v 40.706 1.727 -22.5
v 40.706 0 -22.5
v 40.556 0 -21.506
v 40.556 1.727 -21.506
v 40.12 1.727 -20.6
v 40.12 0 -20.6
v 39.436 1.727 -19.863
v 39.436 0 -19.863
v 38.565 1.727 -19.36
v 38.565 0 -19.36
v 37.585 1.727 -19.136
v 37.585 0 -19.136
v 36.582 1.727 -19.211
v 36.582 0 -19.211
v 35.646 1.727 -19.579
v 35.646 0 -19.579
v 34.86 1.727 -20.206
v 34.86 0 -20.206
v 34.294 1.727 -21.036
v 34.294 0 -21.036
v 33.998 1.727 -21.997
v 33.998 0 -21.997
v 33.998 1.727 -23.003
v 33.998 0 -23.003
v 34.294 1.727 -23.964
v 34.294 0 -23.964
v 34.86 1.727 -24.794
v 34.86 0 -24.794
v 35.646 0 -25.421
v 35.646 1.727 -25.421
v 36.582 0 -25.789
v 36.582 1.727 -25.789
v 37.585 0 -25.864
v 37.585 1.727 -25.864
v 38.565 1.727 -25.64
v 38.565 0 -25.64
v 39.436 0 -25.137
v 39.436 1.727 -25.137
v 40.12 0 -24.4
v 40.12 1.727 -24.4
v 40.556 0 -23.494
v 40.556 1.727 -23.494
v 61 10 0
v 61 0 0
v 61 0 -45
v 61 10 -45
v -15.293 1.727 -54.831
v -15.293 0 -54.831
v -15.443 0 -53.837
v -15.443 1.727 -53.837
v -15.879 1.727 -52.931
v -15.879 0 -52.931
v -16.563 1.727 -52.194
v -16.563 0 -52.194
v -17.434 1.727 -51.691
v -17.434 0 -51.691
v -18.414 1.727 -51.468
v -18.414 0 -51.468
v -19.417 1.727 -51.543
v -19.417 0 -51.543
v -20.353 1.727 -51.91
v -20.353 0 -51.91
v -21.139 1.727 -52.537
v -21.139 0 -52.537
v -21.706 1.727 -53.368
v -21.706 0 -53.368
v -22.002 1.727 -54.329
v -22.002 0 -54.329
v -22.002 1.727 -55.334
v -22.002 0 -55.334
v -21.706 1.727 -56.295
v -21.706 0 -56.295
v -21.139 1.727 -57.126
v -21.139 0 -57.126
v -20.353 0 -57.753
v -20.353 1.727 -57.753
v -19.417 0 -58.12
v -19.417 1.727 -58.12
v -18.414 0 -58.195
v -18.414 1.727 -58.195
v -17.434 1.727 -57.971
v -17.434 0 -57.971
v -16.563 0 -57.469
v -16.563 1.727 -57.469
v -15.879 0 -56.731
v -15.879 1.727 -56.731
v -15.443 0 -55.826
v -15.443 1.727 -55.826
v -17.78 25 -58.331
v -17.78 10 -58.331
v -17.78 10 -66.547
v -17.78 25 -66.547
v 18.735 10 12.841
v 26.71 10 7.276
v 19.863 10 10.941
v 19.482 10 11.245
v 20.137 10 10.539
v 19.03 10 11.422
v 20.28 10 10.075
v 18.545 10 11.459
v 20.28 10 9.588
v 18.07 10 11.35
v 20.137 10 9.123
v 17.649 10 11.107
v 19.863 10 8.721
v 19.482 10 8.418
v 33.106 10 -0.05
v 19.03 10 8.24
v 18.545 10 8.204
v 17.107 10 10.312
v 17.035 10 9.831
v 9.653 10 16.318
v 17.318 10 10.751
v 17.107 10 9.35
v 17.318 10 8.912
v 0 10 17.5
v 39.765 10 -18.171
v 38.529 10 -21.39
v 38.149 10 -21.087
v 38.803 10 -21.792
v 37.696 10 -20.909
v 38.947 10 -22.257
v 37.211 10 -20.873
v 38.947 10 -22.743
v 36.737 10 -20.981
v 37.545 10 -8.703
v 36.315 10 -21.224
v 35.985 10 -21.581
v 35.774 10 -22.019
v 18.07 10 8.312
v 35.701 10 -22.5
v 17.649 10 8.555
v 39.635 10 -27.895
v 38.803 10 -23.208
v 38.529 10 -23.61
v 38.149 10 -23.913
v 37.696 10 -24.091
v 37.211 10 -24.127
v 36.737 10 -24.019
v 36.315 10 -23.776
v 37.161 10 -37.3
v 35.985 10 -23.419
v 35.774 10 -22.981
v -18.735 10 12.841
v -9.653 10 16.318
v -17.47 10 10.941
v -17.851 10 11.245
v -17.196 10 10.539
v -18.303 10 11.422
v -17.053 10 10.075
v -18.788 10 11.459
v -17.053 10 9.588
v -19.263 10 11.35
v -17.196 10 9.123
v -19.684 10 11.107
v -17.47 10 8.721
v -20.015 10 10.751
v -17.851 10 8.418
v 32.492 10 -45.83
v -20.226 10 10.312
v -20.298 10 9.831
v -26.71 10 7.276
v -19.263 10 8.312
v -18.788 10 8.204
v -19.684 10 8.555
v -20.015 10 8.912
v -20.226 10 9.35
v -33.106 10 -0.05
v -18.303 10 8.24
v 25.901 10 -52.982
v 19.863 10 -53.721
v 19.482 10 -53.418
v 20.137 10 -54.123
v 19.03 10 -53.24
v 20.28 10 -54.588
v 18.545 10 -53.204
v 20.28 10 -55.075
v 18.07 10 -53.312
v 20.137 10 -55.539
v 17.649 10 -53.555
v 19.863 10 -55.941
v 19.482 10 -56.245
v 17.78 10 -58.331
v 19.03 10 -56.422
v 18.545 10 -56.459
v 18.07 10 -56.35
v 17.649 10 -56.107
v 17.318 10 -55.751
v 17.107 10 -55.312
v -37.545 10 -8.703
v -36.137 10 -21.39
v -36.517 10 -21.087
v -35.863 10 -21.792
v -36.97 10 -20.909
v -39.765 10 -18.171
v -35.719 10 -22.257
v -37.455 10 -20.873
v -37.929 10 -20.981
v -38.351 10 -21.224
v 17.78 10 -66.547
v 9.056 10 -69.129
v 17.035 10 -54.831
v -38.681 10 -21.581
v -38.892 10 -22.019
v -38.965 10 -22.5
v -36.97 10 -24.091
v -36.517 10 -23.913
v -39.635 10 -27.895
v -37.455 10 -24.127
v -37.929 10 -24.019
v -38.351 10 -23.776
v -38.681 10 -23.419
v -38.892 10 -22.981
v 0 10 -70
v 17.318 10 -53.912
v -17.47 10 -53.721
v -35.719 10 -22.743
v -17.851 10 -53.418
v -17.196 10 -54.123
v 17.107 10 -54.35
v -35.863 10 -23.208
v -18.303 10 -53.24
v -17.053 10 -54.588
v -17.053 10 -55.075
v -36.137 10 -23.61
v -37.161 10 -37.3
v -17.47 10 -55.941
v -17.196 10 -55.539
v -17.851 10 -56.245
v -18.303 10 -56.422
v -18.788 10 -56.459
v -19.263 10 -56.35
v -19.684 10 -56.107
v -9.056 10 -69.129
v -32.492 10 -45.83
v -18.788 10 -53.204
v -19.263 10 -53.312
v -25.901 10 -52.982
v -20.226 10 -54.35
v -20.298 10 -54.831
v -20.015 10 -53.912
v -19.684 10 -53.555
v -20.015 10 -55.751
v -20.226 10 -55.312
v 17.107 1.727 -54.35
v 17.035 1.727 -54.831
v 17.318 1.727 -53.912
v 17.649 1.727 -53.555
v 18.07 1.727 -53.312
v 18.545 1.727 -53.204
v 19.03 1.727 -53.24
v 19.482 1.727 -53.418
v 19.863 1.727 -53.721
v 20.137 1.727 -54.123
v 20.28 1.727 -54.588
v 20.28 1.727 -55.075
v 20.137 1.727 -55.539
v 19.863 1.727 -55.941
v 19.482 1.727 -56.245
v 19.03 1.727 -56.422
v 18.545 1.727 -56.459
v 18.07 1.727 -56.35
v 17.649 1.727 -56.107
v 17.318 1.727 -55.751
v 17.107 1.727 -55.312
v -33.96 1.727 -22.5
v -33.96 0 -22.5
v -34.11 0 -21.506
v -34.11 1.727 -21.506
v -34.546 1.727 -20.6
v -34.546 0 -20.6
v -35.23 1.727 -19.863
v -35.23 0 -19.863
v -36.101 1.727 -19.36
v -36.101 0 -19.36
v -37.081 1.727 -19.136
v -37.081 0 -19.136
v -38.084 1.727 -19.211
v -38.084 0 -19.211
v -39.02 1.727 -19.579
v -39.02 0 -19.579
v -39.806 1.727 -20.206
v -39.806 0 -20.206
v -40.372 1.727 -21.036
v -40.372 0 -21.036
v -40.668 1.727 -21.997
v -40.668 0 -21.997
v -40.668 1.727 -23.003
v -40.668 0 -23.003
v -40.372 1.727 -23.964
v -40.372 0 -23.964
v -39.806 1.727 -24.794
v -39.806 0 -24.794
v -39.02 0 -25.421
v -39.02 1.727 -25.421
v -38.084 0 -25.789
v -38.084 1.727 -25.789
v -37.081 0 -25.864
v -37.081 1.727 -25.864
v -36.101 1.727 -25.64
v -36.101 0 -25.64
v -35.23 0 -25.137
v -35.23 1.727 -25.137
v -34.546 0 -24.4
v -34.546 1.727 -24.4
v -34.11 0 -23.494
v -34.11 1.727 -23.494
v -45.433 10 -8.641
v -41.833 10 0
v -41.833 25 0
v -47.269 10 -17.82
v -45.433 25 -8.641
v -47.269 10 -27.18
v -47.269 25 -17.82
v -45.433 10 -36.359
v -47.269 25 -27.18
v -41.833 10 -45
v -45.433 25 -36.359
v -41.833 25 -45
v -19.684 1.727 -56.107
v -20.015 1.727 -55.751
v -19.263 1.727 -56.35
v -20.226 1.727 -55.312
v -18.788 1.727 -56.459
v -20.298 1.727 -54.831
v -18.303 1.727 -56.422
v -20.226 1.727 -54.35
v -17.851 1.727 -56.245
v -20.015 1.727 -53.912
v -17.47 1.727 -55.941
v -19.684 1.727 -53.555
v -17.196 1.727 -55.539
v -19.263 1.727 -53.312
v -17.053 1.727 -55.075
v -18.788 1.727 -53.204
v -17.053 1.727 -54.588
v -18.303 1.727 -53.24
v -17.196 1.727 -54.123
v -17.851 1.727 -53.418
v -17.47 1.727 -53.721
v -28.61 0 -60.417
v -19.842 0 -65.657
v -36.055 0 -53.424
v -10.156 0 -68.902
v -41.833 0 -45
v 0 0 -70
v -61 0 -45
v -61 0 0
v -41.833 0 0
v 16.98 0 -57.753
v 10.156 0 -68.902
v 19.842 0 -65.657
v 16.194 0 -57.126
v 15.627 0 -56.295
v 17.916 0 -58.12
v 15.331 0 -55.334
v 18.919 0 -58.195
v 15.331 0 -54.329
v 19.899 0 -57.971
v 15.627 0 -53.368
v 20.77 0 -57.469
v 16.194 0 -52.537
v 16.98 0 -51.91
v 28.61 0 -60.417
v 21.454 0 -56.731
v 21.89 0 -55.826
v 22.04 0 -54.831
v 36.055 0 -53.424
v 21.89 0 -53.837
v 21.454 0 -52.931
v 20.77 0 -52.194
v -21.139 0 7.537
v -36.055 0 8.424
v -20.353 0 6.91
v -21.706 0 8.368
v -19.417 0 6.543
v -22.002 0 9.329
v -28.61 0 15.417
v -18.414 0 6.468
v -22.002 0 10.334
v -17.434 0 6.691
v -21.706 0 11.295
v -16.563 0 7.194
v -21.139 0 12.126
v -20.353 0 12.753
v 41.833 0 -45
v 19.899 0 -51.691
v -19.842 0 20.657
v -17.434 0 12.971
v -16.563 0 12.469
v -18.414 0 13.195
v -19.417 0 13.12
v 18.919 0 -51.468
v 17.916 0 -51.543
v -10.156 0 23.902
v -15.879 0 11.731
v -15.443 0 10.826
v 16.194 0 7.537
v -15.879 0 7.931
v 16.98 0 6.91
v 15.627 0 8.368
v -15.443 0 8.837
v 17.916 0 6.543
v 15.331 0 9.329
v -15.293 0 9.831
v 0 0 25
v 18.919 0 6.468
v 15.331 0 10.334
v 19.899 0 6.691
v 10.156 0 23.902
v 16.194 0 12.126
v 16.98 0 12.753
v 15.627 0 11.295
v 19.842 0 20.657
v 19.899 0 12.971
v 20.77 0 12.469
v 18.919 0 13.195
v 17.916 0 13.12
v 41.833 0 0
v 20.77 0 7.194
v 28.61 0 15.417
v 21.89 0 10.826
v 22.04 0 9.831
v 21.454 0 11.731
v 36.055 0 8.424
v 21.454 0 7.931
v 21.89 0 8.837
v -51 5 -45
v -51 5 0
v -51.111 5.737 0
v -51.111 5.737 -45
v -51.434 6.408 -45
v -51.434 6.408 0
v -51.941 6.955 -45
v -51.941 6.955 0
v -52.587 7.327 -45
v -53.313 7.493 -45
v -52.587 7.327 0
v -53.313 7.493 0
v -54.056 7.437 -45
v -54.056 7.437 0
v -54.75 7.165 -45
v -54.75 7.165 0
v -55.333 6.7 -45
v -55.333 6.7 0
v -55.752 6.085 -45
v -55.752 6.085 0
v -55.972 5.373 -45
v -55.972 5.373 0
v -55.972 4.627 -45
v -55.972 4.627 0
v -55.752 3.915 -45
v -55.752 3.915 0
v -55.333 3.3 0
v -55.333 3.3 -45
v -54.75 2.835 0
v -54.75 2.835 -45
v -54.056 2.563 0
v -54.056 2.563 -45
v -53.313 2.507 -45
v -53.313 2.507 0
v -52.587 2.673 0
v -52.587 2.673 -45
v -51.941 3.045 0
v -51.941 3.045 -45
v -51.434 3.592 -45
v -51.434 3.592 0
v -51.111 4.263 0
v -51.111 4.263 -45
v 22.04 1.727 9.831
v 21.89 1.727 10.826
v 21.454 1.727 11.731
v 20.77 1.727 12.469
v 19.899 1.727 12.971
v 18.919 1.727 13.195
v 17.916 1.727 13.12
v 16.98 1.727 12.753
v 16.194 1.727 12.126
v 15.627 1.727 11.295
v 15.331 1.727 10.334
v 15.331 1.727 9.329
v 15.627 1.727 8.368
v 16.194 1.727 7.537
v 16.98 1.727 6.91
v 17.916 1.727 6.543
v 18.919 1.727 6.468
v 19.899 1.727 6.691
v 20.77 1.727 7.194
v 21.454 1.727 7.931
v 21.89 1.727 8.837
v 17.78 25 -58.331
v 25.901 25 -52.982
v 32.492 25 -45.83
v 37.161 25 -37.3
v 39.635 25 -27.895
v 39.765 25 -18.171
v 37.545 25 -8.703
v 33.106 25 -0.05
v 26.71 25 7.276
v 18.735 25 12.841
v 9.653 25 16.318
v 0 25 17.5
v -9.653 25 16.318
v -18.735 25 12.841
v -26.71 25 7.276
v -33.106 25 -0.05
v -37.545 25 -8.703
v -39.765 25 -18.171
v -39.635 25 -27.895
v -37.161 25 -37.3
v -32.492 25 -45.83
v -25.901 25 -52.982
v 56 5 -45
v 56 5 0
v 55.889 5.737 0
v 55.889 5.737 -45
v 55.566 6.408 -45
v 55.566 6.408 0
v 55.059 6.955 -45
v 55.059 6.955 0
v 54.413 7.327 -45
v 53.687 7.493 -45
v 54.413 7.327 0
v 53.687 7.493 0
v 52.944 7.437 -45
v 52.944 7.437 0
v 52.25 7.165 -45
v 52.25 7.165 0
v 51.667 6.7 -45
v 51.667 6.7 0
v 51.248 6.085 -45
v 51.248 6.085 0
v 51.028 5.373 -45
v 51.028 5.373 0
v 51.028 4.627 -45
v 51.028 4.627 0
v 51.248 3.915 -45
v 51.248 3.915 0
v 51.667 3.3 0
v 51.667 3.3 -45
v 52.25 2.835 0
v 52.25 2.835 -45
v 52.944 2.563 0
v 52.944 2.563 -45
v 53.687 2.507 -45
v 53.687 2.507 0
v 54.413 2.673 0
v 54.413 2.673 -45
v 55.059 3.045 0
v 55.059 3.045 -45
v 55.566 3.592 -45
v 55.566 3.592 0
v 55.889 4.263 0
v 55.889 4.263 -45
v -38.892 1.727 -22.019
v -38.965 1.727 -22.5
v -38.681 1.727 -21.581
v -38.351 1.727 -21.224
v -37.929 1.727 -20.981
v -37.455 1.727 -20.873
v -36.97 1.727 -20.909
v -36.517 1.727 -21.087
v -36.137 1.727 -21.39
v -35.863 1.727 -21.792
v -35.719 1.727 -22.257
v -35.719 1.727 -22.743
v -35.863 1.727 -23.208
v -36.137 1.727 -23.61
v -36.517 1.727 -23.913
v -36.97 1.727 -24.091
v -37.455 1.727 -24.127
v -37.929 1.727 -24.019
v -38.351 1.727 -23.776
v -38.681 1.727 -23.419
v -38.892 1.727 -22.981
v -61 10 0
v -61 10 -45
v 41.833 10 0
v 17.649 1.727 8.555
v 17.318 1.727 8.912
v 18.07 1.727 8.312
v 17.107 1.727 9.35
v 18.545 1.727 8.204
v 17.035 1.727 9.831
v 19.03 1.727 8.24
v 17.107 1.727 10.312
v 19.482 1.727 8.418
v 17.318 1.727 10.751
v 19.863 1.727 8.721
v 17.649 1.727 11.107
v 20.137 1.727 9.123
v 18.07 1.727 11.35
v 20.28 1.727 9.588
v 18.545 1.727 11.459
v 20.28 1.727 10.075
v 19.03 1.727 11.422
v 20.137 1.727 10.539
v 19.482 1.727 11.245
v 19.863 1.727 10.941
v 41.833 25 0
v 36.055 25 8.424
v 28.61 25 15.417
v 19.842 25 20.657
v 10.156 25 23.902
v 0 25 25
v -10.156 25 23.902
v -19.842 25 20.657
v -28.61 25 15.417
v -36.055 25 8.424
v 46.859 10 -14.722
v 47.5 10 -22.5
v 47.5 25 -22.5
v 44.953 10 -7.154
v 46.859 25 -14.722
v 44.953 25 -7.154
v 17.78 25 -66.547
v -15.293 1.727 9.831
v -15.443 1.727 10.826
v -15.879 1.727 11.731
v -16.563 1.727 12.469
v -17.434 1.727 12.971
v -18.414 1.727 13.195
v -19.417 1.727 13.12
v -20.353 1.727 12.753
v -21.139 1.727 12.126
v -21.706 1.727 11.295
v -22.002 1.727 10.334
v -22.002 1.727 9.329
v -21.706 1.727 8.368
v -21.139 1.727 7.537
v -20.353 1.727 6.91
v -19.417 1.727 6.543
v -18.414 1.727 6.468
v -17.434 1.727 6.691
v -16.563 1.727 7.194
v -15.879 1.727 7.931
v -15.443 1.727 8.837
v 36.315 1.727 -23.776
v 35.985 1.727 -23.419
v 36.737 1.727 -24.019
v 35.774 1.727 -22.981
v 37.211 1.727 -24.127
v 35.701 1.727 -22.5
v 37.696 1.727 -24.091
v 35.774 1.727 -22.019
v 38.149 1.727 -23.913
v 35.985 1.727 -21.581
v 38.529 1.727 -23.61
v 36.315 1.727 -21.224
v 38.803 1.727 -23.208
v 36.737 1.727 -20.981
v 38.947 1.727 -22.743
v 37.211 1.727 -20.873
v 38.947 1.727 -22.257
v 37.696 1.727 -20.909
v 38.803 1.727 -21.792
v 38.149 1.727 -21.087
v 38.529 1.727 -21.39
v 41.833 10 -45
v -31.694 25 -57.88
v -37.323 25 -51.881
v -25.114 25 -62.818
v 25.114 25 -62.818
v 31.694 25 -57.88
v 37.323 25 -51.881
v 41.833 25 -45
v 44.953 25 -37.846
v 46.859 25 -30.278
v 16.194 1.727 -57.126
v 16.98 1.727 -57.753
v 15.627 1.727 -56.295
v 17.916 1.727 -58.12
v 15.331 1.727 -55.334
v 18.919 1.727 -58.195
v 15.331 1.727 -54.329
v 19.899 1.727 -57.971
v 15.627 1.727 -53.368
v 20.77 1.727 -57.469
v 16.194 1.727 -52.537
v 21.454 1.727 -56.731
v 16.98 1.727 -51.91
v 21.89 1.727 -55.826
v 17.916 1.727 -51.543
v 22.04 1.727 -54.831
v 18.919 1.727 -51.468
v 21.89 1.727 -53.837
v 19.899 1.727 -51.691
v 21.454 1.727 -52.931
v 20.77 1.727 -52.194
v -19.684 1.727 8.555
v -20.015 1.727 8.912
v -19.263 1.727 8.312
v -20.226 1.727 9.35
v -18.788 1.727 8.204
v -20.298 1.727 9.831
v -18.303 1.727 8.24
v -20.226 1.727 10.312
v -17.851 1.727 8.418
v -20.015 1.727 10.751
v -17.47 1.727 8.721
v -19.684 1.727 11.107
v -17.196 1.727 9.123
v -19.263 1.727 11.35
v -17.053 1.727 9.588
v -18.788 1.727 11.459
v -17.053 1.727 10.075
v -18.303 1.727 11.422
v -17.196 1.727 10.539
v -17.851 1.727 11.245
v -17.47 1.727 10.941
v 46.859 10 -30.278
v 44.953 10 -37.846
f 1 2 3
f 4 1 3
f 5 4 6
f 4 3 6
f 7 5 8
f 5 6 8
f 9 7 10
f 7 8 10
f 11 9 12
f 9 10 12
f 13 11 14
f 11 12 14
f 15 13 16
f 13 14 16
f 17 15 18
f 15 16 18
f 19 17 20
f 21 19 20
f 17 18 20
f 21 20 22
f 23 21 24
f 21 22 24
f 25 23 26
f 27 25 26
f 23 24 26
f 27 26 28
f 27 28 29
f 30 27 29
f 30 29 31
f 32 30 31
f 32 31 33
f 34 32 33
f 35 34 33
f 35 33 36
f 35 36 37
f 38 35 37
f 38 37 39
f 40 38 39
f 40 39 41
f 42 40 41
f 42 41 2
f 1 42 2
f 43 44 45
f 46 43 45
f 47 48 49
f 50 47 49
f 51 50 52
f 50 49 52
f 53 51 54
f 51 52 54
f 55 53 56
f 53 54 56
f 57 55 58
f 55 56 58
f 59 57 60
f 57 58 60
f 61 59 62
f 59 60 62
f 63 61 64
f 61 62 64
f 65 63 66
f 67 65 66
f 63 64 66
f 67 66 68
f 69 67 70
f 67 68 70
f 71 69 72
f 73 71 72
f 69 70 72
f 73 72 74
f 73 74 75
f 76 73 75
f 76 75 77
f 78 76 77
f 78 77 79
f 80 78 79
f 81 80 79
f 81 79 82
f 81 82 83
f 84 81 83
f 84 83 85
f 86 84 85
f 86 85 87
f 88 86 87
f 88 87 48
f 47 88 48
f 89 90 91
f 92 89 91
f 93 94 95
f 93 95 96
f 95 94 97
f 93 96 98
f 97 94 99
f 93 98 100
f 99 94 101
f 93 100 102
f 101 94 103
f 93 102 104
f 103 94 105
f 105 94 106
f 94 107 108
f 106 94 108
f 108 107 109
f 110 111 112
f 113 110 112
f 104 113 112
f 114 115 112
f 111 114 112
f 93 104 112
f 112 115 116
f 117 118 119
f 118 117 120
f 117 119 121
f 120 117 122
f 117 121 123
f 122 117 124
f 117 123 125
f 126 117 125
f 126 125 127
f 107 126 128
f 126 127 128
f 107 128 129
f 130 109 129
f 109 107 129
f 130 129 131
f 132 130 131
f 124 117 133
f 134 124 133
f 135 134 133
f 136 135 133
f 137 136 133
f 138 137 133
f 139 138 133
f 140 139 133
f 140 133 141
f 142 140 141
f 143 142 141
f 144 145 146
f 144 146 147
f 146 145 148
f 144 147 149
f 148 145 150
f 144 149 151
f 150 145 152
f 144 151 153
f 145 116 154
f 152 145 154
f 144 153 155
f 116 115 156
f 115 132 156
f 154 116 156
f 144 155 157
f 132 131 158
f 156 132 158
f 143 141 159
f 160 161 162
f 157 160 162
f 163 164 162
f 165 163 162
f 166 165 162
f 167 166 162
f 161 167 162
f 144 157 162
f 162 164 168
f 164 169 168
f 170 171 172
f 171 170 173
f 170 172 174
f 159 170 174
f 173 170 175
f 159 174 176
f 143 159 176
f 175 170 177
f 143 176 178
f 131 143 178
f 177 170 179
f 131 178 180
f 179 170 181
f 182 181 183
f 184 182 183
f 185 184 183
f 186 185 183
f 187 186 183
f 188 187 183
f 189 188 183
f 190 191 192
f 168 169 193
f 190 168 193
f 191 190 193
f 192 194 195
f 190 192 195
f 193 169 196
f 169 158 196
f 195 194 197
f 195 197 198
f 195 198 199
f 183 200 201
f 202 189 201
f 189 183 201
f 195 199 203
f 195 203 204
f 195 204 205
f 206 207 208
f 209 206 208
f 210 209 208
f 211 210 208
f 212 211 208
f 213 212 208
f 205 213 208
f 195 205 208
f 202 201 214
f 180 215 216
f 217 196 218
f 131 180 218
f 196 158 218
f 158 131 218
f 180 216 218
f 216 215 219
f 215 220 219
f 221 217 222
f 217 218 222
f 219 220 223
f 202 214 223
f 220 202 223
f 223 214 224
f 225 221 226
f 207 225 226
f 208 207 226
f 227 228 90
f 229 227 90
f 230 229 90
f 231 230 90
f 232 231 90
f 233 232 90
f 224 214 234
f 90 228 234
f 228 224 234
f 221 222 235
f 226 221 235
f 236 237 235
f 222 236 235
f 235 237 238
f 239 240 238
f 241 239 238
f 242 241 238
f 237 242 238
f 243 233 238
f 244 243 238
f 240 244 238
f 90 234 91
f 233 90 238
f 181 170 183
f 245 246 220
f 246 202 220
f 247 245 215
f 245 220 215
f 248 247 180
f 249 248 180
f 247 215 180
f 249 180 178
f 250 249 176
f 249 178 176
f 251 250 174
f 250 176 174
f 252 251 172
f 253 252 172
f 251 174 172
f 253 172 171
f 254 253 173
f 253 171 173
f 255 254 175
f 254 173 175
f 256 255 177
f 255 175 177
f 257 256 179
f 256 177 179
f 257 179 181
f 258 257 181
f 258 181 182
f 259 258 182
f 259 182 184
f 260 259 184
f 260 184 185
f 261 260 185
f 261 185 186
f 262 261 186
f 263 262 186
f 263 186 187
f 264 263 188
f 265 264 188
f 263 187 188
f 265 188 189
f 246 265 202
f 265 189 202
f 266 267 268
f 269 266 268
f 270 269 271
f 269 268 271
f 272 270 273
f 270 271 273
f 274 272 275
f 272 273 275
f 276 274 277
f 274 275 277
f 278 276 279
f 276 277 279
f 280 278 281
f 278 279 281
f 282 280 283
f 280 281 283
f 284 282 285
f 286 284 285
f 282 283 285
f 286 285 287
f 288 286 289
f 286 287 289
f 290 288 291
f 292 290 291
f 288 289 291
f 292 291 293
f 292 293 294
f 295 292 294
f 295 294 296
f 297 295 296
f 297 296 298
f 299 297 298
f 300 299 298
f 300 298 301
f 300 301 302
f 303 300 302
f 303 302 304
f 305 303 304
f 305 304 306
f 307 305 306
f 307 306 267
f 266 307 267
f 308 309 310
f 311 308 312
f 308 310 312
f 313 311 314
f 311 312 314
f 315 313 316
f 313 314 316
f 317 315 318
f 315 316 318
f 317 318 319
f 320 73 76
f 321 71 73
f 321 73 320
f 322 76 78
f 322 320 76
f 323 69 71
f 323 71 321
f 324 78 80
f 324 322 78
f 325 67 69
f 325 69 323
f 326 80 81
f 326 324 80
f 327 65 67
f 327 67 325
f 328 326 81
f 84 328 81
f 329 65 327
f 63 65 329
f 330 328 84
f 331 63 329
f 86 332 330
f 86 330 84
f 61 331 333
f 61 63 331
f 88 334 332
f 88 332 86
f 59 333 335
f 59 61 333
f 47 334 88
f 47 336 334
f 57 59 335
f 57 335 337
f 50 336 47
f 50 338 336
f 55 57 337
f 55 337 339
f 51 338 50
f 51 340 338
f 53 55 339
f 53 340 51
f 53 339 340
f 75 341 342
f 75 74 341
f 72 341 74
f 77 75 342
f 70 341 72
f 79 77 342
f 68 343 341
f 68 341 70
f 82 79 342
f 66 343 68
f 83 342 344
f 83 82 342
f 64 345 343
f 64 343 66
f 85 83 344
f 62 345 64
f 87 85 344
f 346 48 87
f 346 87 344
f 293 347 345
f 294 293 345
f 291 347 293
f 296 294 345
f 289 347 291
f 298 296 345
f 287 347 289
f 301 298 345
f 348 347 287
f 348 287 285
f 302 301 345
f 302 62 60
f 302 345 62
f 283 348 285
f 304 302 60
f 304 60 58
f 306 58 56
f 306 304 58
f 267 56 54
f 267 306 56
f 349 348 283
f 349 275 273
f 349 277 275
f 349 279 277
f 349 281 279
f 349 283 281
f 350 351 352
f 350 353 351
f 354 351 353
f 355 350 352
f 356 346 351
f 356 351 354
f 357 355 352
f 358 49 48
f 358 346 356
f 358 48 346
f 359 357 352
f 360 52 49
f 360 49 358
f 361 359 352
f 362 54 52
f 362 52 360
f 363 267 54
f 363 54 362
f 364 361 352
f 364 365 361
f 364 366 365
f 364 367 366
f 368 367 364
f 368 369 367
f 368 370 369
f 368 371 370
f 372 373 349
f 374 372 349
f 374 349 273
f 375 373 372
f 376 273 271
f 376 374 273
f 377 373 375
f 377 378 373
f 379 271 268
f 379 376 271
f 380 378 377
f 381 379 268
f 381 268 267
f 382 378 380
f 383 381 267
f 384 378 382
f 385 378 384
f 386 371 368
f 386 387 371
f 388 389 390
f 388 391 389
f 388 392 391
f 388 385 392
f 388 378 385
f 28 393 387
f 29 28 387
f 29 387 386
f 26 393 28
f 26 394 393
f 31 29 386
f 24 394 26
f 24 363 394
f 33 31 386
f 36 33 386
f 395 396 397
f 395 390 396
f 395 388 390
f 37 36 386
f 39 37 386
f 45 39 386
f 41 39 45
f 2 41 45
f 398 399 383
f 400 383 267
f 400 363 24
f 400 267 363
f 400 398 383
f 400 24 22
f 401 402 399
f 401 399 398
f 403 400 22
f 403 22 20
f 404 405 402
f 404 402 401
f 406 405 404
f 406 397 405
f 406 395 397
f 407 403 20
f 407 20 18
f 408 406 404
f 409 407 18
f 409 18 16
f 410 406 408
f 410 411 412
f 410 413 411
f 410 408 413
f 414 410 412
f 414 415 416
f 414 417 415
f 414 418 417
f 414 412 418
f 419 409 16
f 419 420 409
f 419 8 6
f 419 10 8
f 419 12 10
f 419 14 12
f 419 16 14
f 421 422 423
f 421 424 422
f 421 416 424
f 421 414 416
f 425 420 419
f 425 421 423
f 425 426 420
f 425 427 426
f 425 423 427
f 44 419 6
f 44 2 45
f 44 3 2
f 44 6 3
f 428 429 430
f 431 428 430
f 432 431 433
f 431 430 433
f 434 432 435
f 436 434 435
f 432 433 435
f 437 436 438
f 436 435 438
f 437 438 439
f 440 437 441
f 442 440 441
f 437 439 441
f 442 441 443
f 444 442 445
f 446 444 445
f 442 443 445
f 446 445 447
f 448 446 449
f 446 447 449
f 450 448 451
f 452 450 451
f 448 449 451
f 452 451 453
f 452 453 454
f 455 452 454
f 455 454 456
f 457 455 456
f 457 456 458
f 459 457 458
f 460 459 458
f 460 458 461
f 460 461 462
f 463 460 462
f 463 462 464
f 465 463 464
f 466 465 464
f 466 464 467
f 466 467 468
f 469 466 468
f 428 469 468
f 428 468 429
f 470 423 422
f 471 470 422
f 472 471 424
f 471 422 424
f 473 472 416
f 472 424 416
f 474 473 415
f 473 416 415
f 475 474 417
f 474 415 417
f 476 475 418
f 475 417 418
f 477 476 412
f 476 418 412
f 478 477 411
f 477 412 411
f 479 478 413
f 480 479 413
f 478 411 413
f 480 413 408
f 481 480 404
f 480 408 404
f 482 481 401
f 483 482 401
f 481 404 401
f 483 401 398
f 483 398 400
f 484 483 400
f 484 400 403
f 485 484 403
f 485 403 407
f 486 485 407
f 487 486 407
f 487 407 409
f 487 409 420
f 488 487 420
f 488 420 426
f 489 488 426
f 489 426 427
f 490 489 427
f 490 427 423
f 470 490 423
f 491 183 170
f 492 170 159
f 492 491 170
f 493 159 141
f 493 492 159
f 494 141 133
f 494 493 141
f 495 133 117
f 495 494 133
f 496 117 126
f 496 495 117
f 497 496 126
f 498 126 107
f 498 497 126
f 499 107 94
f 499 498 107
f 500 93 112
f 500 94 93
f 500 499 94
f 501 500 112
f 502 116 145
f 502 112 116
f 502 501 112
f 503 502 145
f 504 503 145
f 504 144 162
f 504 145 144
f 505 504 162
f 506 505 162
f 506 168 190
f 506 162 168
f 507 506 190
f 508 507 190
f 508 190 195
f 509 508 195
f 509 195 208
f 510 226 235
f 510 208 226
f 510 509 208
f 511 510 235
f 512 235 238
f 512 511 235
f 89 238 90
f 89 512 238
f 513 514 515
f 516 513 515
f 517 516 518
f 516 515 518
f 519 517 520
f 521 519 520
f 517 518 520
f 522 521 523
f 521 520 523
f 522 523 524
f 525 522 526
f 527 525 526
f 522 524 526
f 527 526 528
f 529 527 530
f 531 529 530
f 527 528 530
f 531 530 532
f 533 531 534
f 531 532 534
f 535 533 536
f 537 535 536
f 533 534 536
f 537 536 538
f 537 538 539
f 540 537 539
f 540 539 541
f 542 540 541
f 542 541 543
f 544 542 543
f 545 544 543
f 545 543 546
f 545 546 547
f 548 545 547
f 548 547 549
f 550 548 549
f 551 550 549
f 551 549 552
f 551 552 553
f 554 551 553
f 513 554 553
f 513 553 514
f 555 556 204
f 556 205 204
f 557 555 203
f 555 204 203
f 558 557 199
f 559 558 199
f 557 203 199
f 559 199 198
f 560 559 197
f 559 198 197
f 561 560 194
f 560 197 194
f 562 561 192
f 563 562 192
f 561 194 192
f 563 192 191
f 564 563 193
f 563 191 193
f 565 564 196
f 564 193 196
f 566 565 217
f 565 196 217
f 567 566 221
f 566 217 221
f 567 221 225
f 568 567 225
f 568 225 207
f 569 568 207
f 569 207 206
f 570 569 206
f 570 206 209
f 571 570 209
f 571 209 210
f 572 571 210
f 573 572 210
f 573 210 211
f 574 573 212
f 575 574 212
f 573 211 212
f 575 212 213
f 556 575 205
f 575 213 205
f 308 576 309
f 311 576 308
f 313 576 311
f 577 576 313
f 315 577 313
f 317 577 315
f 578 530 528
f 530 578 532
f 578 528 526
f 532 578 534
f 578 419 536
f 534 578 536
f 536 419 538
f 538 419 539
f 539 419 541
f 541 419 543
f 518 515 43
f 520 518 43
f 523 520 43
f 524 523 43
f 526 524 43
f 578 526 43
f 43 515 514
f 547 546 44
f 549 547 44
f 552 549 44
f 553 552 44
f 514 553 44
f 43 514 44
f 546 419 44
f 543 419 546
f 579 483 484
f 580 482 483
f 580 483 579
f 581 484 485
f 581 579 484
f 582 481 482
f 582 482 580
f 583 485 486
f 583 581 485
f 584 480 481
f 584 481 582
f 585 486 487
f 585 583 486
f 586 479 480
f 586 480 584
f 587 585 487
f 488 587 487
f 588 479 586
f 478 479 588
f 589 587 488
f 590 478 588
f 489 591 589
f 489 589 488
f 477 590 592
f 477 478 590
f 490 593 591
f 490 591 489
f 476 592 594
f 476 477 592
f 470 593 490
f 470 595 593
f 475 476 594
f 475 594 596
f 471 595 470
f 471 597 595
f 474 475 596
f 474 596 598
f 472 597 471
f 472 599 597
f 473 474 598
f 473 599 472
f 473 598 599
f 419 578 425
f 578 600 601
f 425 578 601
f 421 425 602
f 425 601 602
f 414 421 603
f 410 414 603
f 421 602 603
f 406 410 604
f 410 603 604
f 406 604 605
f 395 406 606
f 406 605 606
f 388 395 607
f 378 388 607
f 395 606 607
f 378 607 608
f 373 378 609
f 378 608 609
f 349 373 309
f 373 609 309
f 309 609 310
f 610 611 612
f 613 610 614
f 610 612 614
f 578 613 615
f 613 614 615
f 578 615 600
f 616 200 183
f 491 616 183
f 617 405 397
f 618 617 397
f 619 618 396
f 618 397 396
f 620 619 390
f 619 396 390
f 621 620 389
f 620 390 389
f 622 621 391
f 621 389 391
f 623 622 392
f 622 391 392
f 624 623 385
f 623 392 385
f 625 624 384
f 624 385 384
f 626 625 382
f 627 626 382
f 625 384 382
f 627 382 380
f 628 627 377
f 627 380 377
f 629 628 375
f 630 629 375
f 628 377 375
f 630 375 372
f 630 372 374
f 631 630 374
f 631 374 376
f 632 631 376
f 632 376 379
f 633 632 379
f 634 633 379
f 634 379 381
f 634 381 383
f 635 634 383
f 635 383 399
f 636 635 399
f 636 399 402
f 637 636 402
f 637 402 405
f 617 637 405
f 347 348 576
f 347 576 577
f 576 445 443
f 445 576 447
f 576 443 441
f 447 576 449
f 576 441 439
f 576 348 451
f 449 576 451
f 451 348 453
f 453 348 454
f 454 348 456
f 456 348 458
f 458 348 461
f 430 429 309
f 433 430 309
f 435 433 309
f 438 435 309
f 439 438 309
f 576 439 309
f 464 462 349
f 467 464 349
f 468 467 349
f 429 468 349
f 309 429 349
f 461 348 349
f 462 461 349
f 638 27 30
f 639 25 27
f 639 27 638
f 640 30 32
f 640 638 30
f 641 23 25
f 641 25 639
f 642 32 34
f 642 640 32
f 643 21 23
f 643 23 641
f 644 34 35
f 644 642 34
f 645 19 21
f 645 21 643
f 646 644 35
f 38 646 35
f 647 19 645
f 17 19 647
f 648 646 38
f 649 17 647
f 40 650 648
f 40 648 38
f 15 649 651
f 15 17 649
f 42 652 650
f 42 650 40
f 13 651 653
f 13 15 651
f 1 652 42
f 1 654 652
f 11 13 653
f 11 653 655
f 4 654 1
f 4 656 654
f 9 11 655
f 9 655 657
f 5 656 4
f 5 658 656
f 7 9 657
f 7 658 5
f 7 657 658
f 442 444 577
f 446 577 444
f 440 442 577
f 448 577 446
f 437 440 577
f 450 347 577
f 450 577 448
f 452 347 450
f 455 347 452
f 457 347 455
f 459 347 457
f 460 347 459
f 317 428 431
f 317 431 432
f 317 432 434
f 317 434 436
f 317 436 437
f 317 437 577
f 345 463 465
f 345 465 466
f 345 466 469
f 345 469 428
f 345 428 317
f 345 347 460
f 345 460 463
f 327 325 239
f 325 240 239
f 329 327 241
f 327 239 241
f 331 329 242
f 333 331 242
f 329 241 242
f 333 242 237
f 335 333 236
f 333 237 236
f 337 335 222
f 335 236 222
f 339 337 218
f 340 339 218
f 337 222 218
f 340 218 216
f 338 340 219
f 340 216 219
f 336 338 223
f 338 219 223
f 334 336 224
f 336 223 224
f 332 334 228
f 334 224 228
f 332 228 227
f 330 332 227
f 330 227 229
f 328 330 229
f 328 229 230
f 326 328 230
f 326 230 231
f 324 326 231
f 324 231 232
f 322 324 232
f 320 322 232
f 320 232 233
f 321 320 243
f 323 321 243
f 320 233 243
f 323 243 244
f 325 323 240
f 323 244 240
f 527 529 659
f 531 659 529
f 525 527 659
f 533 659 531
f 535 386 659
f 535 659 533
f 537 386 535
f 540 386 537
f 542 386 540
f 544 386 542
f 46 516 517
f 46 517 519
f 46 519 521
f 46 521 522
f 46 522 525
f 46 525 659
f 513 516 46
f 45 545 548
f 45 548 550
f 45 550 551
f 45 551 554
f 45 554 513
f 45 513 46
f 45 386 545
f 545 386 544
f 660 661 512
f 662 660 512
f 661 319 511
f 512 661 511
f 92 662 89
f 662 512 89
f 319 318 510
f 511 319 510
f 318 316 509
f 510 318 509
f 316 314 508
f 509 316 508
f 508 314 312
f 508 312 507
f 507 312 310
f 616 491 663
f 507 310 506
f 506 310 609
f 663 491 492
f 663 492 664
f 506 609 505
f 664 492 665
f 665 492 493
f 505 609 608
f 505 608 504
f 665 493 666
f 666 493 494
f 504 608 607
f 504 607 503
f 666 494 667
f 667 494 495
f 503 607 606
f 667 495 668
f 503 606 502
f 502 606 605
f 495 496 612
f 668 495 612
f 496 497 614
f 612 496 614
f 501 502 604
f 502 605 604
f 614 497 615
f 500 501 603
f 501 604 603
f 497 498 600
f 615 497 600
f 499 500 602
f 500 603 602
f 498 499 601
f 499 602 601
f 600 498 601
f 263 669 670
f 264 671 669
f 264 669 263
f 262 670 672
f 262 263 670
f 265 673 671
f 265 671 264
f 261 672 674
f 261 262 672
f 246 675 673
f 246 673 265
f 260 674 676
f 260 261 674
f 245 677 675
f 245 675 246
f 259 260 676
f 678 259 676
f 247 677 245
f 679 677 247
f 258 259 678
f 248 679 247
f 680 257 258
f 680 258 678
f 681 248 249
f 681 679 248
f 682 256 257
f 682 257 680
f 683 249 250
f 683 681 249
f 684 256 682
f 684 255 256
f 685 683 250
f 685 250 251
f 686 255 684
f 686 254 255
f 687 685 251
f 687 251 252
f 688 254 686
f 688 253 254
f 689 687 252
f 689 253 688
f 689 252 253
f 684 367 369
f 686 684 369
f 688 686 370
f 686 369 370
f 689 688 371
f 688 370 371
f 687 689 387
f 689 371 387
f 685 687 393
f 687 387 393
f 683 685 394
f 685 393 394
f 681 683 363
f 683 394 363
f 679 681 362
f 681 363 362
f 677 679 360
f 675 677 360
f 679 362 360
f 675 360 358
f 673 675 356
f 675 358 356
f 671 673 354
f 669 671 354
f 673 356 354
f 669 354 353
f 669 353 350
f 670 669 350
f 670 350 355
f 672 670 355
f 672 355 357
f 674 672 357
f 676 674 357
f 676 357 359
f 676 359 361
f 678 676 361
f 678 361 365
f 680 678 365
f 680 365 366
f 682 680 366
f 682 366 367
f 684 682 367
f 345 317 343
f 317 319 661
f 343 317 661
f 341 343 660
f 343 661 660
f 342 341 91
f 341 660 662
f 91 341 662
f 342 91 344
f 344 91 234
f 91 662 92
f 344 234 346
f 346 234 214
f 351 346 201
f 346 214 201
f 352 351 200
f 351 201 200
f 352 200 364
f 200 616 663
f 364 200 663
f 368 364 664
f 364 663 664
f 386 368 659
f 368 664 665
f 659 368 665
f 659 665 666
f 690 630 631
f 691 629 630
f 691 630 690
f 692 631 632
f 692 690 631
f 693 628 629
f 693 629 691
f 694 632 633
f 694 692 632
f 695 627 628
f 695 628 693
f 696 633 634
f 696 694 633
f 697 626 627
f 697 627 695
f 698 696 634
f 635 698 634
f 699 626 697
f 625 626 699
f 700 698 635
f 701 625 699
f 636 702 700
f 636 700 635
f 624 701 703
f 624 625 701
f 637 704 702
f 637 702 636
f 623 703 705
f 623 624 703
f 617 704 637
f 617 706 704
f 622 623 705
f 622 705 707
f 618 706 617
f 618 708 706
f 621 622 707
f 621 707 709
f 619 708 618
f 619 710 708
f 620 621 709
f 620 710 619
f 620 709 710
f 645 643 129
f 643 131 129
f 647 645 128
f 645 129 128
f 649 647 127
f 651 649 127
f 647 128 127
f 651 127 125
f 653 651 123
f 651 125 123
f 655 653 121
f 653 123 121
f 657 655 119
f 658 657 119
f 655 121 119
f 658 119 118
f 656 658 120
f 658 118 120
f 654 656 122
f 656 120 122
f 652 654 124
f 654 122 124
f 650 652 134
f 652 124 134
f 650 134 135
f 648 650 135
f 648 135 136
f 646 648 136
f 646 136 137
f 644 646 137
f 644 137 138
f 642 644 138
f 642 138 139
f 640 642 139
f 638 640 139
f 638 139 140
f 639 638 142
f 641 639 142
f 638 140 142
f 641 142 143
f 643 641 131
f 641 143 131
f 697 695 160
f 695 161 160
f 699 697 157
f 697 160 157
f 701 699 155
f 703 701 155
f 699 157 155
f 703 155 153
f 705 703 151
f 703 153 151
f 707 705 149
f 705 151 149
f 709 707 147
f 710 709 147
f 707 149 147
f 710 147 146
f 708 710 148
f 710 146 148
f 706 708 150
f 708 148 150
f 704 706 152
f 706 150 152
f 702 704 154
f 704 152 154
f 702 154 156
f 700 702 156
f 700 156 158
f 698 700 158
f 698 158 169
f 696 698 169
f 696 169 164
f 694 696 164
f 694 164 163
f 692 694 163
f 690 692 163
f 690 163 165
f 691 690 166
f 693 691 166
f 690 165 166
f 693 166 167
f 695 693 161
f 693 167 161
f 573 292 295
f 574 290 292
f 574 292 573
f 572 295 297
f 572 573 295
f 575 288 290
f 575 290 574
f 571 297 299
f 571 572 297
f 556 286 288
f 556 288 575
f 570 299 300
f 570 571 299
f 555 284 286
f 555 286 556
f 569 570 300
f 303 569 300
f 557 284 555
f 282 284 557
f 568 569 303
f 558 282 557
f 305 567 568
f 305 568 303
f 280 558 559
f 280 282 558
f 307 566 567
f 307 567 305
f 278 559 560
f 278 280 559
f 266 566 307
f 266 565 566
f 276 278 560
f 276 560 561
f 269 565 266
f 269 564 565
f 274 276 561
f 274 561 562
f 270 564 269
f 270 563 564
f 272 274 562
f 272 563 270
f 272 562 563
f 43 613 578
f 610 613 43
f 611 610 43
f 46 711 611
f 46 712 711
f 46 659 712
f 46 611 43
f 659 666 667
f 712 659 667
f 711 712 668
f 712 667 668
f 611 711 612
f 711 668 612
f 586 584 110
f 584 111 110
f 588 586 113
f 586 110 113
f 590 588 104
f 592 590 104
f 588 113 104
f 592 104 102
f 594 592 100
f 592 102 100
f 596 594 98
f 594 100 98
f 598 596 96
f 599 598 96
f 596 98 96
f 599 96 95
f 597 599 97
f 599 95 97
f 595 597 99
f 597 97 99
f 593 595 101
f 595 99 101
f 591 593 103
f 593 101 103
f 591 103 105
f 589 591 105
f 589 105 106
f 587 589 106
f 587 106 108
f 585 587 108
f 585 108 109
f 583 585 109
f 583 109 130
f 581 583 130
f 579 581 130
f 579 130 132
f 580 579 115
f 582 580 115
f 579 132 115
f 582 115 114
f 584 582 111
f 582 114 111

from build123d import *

# Parameters (mm, degrees)
SKETCH7_W                                           = 122
SKETCH7_H                                           = 45
BOSS_EXTRUDE1_DEPTH                                 = 10
SKETCH9_R                                           = 2.5
BOSS_EXTRUDE2_DEPTH                                 = 10
BOSS_EXTRUDE3_START                                 = -25
SKETCH10_R                                          = 40
BOSS_EXTRUDE3_DEPTH                                 = 25
SKETCH11_R                                          = 2.5
CUT_EXTRUDE5_DEPTH                                  = 97.15612305
CUT_EXTRUDE6_DEPTH                                  = 95.053176448
CBORE_FOR_4_BINDING_HEAD_MACHINE_SCREW1_D           = 3.2639
CBORE_FOR_4_BINDING_HEAD_MACHINE_SCREW1_CBORE_D     = 6.74624
CBORE_FOR_4_BINDING_HEAD_MACHINE_SCREW1_CBORE_DEPTH = 1.7272


with BuildPart() as part:
    # Sketch7 → Boss-Extrude1 (new body)
    with BuildSketch(Plane(origin=(0, 0, 0), x_dir=(1, 0, 0), z_dir=(0, 1, 0))):
        with Locations((0, 22.5)):
            Rectangle(SKETCH7_W, SKETCH7_H)
    extrude(amount=BOSS_EXTRUDE1_DEPTH)

    # Sketch9 → Boss-Extrude2 (add)
    # profile 1 of 9: a face of its own
    with BuildSketch(Plane(origin=(0, 10, 0), x_dir=(1, 0, 0), z_dir=(0, 1, 0))):
        with BuildLine():
            ThreePointArc((35.858512086, 0), (40.682190705, 10.793495465), (42.333, 22.5))
            ThreePointArc((42.333, 22.5), (40.682190705, 34.206504535), (35.858512086, 45))
            Line((35.858512086, 45), (-35.858512086, 45))
            ThreePointArc((-35.858512086, 45), (-42.333, 22.5), (-35.858512086, 0))
            Line((-35.858512086, 0), (35.858512086, 0))
        make_face()
        with Locations((37.333, 22.5)):
            Circle(SKETCH9_R, mode=Mode.SUBTRACT)
        with Locations((-37.333, 22.5)):
            Circle(SKETCH9_R, mode=Mode.SUBTRACT)
    # profile 2 of 9: a face of its own
    with BuildSketch(Plane(origin=(0, 10, 0), x_dir=(1, 0, 0), z_dir=(0, 1, 0))):
        with Locations((37.333, 22.5)):
            Circle(SKETCH9_R)
    # profile 3 of 9: a face of its own
    with BuildSketch(Plane(origin=(0, 10, 0), x_dir=(1, 0, 0), z_dir=(0, 1, 0))):
        with Locations((-37.333, 22.5)):
            Circle(SKETCH9_R)
    # profile 4 of 9: a face of its own
    with BuildSketch(Plane(origin=(0, 10, 0), x_dir=(1, 0, 0), z_dir=(0, 1, 0))):
        with BuildLine():
            ThreePointArc((-35.858512086, 0), (0, -19.833), (35.858512086, 0))
            Line((35.858512086, 0), (-35.858512086, 0))
        make_face()
        with Locations((-18.6665, -9.831326399)):
            Circle(SKETCH9_R, mode=Mode.SUBTRACT)
        with Locations((18.6665, -9.831326399)):
            Circle(SKETCH9_R, mode=Mode.SUBTRACT)
    # profile 5 of 9: a face of its own
    with BuildSketch(Plane(origin=(0, 10, 0), x_dir=(1, 0, 0), z_dir=(0, 1, 0))):
        with Locations((18.6665, -9.831326399)):
            Circle(SKETCH9_R)
    # profile 6 of 9: a face of its own
    with BuildSketch(Plane(origin=(0, 10, 0), x_dir=(1, 0, 0), z_dir=(0, 1, 0))):
        with Locations((-18.6665, -9.831326399)):
            Circle(SKETCH9_R)
    # profile 7 of 9: a face of its own
    with BuildSketch(Plane(origin=(0, 10, 0), x_dir=(1, 0, 0), z_dir=(0, 1, 0))):
        with BuildLine():
            Line((-35.858512086, 45), (35.858512086, 45))
            ThreePointArc((35.858512086, 45), (0, 64.833), (-35.858512086, 45))
        make_face()
        with Locations((-18.6665, 54.831326399)):
            Circle(SKETCH9_R, mode=Mode.SUBTRACT)
        with Locations((18.6665, 54.831326399)):
            Circle(SKETCH9_R, mode=Mode.SUBTRACT)
    # profile 8 of 9: a face of its own
    with BuildSketch(Plane(origin=(0, 10, 0), x_dir=(1, 0, 0), z_dir=(0, 1, 0))):
        with Locations((18.6665, 54.831326399)):
            Circle(SKETCH9_R)
    # profile 9 of 9: a face of its own
    with BuildSketch(Plane(origin=(0, 10, 0), x_dir=(1, 0, 0), z_dir=(0, 1, 0))):
        with Locations((-18.6665, 54.831326399)):
            Circle(SKETCH9_R)
    extrude(amount=-BOSS_EXTRUDE2_DEPTH)

    # Sketch10 → Boss-Extrude3 (add)
    # profile 1 of 3: a face of its own
    with BuildSketch(Plane.XZ.offset(BOSS_EXTRUDE3_START)):
        with BuildLine():
            ThreePointArc((-41.833001327, -45), (0, -70), (41.833001327, -45))
            Line((41.833001327, -45), (35.858512086, -45))
            ThreePointArc((35.858512086, -45), (0, -64.833), (-35.858512086, -45))
            Line((-35.858512086, -45), (-41.833001327, -45))
        make_face()
    # profile 2 of 3: a face of its own
    with BuildSketch(Plane.XZ.offset(BOSS_EXTRUDE3_START)):
        with BuildLine():
            ThreePointArc((41.833001327, -45), (46.061467427, -34.101345547), (47.5, -22.5))
            ThreePointArc((47.5, -22.5), (46.061467427, -10.898654453), (41.833001327, 0))
            Line((41.833001327, 0), (35.858512086, 0))
            ThreePointArc((35.858512086, 0), (0, 19.833), (-35.858512086, 0))
            Line((-35.858512086, 0), (-41.833001327, 0))
            ThreePointArc((-41.833001327, 0), (-47.5, -22.5), (-41.833001327, -45))
            Line((-41.833001327, -45), (-35.858512086, -45))
            ThreePointArc((-35.858512086, -45), (0, -64.833), (35.858512086, -45))
            Line((35.858512086, -45), (41.833001327, -45))
        make_face()
        with Locations(Location((0, -22.5, 0), (0, 0, 270))):
            Circle(SKETCH10_R, mode=Mode.SUBTRACT)
    # profile 3 of 3: a face of its own
    with BuildSketch(Plane.XZ.offset(BOSS_EXTRUDE3_START)):
        with BuildLine():
            Line((35.858512086, 0), (41.833001327, 0))
            ThreePointArc((41.833001327, 0), (0, 25), (-41.833001327, 0))
            Line((-41.833001327, 0), (-35.858512086, 0))
            ThreePointArc((-35.858512086, 0), (0, 19.833), (35.858512086, 0))
        make_face()
    extrude(amount=BOSS_EXTRUDE3_DEPTH)

    # Sketch11 → Cut-Extrude5 (cut, through all)
    with BuildSketch(Plane.XY):
        with Locations((-53.5, 5)):
            Circle(SKETCH11_R)
        with Locations((53.5, 5)):
            Circle(SKETCH11_R)
    extrude(amount=-CUT_EXTRUDE5_DEPTH, mode=Mode.SUBTRACT)

    # Sketch12 → Cut-Extrude6 (cut, through all)
    with BuildSketch(Plane(origin=(0, 10, 0), x_dir=(1, 0, 0), z_dir=(0, 1, 0))):
        with BuildLine():
            Line((-17.78, 58.331154042), (-17.78, 66.546811462))
            ThreePointArc((-17.78, 66.546811462), (0, 70), (17.78, 66.546811462))
            Line((17.78, 66.546811462), (17.78, 58.331154042))
            ThreePointArc((17.78, 58.331154042), (0, 62.5), (-17.78, 58.331154042))
        make_face()
    extrude(amount=CUT_EXTRUDE6_DEPTH, mode=Mode.SUBTRACT)

    # CBORE for #4 Binding Head Machine Screw1 (through all)
    with Locations(Plane.XZ):
        with Locations((-18.6665, 9.831326399), (18.6665, 9.831326399), (37.333, -22.5), (18.6665, -54.831326399), (-18.6665, -54.831326399), (-37.333, -22.5)):
            CounterBoreHole(CBORE_FOR_4_BINDING_HEAD_MACHINE_SCREW1_D / 2, CBORE_FOR_4_BINDING_HEAD_MACHINE_SCREW1_CBORE_D / 2, CBORE_FOR_4_BINDING_HEAD_MACHINE_SCREW1_CBORE_DEPTH)


solid = part.part
